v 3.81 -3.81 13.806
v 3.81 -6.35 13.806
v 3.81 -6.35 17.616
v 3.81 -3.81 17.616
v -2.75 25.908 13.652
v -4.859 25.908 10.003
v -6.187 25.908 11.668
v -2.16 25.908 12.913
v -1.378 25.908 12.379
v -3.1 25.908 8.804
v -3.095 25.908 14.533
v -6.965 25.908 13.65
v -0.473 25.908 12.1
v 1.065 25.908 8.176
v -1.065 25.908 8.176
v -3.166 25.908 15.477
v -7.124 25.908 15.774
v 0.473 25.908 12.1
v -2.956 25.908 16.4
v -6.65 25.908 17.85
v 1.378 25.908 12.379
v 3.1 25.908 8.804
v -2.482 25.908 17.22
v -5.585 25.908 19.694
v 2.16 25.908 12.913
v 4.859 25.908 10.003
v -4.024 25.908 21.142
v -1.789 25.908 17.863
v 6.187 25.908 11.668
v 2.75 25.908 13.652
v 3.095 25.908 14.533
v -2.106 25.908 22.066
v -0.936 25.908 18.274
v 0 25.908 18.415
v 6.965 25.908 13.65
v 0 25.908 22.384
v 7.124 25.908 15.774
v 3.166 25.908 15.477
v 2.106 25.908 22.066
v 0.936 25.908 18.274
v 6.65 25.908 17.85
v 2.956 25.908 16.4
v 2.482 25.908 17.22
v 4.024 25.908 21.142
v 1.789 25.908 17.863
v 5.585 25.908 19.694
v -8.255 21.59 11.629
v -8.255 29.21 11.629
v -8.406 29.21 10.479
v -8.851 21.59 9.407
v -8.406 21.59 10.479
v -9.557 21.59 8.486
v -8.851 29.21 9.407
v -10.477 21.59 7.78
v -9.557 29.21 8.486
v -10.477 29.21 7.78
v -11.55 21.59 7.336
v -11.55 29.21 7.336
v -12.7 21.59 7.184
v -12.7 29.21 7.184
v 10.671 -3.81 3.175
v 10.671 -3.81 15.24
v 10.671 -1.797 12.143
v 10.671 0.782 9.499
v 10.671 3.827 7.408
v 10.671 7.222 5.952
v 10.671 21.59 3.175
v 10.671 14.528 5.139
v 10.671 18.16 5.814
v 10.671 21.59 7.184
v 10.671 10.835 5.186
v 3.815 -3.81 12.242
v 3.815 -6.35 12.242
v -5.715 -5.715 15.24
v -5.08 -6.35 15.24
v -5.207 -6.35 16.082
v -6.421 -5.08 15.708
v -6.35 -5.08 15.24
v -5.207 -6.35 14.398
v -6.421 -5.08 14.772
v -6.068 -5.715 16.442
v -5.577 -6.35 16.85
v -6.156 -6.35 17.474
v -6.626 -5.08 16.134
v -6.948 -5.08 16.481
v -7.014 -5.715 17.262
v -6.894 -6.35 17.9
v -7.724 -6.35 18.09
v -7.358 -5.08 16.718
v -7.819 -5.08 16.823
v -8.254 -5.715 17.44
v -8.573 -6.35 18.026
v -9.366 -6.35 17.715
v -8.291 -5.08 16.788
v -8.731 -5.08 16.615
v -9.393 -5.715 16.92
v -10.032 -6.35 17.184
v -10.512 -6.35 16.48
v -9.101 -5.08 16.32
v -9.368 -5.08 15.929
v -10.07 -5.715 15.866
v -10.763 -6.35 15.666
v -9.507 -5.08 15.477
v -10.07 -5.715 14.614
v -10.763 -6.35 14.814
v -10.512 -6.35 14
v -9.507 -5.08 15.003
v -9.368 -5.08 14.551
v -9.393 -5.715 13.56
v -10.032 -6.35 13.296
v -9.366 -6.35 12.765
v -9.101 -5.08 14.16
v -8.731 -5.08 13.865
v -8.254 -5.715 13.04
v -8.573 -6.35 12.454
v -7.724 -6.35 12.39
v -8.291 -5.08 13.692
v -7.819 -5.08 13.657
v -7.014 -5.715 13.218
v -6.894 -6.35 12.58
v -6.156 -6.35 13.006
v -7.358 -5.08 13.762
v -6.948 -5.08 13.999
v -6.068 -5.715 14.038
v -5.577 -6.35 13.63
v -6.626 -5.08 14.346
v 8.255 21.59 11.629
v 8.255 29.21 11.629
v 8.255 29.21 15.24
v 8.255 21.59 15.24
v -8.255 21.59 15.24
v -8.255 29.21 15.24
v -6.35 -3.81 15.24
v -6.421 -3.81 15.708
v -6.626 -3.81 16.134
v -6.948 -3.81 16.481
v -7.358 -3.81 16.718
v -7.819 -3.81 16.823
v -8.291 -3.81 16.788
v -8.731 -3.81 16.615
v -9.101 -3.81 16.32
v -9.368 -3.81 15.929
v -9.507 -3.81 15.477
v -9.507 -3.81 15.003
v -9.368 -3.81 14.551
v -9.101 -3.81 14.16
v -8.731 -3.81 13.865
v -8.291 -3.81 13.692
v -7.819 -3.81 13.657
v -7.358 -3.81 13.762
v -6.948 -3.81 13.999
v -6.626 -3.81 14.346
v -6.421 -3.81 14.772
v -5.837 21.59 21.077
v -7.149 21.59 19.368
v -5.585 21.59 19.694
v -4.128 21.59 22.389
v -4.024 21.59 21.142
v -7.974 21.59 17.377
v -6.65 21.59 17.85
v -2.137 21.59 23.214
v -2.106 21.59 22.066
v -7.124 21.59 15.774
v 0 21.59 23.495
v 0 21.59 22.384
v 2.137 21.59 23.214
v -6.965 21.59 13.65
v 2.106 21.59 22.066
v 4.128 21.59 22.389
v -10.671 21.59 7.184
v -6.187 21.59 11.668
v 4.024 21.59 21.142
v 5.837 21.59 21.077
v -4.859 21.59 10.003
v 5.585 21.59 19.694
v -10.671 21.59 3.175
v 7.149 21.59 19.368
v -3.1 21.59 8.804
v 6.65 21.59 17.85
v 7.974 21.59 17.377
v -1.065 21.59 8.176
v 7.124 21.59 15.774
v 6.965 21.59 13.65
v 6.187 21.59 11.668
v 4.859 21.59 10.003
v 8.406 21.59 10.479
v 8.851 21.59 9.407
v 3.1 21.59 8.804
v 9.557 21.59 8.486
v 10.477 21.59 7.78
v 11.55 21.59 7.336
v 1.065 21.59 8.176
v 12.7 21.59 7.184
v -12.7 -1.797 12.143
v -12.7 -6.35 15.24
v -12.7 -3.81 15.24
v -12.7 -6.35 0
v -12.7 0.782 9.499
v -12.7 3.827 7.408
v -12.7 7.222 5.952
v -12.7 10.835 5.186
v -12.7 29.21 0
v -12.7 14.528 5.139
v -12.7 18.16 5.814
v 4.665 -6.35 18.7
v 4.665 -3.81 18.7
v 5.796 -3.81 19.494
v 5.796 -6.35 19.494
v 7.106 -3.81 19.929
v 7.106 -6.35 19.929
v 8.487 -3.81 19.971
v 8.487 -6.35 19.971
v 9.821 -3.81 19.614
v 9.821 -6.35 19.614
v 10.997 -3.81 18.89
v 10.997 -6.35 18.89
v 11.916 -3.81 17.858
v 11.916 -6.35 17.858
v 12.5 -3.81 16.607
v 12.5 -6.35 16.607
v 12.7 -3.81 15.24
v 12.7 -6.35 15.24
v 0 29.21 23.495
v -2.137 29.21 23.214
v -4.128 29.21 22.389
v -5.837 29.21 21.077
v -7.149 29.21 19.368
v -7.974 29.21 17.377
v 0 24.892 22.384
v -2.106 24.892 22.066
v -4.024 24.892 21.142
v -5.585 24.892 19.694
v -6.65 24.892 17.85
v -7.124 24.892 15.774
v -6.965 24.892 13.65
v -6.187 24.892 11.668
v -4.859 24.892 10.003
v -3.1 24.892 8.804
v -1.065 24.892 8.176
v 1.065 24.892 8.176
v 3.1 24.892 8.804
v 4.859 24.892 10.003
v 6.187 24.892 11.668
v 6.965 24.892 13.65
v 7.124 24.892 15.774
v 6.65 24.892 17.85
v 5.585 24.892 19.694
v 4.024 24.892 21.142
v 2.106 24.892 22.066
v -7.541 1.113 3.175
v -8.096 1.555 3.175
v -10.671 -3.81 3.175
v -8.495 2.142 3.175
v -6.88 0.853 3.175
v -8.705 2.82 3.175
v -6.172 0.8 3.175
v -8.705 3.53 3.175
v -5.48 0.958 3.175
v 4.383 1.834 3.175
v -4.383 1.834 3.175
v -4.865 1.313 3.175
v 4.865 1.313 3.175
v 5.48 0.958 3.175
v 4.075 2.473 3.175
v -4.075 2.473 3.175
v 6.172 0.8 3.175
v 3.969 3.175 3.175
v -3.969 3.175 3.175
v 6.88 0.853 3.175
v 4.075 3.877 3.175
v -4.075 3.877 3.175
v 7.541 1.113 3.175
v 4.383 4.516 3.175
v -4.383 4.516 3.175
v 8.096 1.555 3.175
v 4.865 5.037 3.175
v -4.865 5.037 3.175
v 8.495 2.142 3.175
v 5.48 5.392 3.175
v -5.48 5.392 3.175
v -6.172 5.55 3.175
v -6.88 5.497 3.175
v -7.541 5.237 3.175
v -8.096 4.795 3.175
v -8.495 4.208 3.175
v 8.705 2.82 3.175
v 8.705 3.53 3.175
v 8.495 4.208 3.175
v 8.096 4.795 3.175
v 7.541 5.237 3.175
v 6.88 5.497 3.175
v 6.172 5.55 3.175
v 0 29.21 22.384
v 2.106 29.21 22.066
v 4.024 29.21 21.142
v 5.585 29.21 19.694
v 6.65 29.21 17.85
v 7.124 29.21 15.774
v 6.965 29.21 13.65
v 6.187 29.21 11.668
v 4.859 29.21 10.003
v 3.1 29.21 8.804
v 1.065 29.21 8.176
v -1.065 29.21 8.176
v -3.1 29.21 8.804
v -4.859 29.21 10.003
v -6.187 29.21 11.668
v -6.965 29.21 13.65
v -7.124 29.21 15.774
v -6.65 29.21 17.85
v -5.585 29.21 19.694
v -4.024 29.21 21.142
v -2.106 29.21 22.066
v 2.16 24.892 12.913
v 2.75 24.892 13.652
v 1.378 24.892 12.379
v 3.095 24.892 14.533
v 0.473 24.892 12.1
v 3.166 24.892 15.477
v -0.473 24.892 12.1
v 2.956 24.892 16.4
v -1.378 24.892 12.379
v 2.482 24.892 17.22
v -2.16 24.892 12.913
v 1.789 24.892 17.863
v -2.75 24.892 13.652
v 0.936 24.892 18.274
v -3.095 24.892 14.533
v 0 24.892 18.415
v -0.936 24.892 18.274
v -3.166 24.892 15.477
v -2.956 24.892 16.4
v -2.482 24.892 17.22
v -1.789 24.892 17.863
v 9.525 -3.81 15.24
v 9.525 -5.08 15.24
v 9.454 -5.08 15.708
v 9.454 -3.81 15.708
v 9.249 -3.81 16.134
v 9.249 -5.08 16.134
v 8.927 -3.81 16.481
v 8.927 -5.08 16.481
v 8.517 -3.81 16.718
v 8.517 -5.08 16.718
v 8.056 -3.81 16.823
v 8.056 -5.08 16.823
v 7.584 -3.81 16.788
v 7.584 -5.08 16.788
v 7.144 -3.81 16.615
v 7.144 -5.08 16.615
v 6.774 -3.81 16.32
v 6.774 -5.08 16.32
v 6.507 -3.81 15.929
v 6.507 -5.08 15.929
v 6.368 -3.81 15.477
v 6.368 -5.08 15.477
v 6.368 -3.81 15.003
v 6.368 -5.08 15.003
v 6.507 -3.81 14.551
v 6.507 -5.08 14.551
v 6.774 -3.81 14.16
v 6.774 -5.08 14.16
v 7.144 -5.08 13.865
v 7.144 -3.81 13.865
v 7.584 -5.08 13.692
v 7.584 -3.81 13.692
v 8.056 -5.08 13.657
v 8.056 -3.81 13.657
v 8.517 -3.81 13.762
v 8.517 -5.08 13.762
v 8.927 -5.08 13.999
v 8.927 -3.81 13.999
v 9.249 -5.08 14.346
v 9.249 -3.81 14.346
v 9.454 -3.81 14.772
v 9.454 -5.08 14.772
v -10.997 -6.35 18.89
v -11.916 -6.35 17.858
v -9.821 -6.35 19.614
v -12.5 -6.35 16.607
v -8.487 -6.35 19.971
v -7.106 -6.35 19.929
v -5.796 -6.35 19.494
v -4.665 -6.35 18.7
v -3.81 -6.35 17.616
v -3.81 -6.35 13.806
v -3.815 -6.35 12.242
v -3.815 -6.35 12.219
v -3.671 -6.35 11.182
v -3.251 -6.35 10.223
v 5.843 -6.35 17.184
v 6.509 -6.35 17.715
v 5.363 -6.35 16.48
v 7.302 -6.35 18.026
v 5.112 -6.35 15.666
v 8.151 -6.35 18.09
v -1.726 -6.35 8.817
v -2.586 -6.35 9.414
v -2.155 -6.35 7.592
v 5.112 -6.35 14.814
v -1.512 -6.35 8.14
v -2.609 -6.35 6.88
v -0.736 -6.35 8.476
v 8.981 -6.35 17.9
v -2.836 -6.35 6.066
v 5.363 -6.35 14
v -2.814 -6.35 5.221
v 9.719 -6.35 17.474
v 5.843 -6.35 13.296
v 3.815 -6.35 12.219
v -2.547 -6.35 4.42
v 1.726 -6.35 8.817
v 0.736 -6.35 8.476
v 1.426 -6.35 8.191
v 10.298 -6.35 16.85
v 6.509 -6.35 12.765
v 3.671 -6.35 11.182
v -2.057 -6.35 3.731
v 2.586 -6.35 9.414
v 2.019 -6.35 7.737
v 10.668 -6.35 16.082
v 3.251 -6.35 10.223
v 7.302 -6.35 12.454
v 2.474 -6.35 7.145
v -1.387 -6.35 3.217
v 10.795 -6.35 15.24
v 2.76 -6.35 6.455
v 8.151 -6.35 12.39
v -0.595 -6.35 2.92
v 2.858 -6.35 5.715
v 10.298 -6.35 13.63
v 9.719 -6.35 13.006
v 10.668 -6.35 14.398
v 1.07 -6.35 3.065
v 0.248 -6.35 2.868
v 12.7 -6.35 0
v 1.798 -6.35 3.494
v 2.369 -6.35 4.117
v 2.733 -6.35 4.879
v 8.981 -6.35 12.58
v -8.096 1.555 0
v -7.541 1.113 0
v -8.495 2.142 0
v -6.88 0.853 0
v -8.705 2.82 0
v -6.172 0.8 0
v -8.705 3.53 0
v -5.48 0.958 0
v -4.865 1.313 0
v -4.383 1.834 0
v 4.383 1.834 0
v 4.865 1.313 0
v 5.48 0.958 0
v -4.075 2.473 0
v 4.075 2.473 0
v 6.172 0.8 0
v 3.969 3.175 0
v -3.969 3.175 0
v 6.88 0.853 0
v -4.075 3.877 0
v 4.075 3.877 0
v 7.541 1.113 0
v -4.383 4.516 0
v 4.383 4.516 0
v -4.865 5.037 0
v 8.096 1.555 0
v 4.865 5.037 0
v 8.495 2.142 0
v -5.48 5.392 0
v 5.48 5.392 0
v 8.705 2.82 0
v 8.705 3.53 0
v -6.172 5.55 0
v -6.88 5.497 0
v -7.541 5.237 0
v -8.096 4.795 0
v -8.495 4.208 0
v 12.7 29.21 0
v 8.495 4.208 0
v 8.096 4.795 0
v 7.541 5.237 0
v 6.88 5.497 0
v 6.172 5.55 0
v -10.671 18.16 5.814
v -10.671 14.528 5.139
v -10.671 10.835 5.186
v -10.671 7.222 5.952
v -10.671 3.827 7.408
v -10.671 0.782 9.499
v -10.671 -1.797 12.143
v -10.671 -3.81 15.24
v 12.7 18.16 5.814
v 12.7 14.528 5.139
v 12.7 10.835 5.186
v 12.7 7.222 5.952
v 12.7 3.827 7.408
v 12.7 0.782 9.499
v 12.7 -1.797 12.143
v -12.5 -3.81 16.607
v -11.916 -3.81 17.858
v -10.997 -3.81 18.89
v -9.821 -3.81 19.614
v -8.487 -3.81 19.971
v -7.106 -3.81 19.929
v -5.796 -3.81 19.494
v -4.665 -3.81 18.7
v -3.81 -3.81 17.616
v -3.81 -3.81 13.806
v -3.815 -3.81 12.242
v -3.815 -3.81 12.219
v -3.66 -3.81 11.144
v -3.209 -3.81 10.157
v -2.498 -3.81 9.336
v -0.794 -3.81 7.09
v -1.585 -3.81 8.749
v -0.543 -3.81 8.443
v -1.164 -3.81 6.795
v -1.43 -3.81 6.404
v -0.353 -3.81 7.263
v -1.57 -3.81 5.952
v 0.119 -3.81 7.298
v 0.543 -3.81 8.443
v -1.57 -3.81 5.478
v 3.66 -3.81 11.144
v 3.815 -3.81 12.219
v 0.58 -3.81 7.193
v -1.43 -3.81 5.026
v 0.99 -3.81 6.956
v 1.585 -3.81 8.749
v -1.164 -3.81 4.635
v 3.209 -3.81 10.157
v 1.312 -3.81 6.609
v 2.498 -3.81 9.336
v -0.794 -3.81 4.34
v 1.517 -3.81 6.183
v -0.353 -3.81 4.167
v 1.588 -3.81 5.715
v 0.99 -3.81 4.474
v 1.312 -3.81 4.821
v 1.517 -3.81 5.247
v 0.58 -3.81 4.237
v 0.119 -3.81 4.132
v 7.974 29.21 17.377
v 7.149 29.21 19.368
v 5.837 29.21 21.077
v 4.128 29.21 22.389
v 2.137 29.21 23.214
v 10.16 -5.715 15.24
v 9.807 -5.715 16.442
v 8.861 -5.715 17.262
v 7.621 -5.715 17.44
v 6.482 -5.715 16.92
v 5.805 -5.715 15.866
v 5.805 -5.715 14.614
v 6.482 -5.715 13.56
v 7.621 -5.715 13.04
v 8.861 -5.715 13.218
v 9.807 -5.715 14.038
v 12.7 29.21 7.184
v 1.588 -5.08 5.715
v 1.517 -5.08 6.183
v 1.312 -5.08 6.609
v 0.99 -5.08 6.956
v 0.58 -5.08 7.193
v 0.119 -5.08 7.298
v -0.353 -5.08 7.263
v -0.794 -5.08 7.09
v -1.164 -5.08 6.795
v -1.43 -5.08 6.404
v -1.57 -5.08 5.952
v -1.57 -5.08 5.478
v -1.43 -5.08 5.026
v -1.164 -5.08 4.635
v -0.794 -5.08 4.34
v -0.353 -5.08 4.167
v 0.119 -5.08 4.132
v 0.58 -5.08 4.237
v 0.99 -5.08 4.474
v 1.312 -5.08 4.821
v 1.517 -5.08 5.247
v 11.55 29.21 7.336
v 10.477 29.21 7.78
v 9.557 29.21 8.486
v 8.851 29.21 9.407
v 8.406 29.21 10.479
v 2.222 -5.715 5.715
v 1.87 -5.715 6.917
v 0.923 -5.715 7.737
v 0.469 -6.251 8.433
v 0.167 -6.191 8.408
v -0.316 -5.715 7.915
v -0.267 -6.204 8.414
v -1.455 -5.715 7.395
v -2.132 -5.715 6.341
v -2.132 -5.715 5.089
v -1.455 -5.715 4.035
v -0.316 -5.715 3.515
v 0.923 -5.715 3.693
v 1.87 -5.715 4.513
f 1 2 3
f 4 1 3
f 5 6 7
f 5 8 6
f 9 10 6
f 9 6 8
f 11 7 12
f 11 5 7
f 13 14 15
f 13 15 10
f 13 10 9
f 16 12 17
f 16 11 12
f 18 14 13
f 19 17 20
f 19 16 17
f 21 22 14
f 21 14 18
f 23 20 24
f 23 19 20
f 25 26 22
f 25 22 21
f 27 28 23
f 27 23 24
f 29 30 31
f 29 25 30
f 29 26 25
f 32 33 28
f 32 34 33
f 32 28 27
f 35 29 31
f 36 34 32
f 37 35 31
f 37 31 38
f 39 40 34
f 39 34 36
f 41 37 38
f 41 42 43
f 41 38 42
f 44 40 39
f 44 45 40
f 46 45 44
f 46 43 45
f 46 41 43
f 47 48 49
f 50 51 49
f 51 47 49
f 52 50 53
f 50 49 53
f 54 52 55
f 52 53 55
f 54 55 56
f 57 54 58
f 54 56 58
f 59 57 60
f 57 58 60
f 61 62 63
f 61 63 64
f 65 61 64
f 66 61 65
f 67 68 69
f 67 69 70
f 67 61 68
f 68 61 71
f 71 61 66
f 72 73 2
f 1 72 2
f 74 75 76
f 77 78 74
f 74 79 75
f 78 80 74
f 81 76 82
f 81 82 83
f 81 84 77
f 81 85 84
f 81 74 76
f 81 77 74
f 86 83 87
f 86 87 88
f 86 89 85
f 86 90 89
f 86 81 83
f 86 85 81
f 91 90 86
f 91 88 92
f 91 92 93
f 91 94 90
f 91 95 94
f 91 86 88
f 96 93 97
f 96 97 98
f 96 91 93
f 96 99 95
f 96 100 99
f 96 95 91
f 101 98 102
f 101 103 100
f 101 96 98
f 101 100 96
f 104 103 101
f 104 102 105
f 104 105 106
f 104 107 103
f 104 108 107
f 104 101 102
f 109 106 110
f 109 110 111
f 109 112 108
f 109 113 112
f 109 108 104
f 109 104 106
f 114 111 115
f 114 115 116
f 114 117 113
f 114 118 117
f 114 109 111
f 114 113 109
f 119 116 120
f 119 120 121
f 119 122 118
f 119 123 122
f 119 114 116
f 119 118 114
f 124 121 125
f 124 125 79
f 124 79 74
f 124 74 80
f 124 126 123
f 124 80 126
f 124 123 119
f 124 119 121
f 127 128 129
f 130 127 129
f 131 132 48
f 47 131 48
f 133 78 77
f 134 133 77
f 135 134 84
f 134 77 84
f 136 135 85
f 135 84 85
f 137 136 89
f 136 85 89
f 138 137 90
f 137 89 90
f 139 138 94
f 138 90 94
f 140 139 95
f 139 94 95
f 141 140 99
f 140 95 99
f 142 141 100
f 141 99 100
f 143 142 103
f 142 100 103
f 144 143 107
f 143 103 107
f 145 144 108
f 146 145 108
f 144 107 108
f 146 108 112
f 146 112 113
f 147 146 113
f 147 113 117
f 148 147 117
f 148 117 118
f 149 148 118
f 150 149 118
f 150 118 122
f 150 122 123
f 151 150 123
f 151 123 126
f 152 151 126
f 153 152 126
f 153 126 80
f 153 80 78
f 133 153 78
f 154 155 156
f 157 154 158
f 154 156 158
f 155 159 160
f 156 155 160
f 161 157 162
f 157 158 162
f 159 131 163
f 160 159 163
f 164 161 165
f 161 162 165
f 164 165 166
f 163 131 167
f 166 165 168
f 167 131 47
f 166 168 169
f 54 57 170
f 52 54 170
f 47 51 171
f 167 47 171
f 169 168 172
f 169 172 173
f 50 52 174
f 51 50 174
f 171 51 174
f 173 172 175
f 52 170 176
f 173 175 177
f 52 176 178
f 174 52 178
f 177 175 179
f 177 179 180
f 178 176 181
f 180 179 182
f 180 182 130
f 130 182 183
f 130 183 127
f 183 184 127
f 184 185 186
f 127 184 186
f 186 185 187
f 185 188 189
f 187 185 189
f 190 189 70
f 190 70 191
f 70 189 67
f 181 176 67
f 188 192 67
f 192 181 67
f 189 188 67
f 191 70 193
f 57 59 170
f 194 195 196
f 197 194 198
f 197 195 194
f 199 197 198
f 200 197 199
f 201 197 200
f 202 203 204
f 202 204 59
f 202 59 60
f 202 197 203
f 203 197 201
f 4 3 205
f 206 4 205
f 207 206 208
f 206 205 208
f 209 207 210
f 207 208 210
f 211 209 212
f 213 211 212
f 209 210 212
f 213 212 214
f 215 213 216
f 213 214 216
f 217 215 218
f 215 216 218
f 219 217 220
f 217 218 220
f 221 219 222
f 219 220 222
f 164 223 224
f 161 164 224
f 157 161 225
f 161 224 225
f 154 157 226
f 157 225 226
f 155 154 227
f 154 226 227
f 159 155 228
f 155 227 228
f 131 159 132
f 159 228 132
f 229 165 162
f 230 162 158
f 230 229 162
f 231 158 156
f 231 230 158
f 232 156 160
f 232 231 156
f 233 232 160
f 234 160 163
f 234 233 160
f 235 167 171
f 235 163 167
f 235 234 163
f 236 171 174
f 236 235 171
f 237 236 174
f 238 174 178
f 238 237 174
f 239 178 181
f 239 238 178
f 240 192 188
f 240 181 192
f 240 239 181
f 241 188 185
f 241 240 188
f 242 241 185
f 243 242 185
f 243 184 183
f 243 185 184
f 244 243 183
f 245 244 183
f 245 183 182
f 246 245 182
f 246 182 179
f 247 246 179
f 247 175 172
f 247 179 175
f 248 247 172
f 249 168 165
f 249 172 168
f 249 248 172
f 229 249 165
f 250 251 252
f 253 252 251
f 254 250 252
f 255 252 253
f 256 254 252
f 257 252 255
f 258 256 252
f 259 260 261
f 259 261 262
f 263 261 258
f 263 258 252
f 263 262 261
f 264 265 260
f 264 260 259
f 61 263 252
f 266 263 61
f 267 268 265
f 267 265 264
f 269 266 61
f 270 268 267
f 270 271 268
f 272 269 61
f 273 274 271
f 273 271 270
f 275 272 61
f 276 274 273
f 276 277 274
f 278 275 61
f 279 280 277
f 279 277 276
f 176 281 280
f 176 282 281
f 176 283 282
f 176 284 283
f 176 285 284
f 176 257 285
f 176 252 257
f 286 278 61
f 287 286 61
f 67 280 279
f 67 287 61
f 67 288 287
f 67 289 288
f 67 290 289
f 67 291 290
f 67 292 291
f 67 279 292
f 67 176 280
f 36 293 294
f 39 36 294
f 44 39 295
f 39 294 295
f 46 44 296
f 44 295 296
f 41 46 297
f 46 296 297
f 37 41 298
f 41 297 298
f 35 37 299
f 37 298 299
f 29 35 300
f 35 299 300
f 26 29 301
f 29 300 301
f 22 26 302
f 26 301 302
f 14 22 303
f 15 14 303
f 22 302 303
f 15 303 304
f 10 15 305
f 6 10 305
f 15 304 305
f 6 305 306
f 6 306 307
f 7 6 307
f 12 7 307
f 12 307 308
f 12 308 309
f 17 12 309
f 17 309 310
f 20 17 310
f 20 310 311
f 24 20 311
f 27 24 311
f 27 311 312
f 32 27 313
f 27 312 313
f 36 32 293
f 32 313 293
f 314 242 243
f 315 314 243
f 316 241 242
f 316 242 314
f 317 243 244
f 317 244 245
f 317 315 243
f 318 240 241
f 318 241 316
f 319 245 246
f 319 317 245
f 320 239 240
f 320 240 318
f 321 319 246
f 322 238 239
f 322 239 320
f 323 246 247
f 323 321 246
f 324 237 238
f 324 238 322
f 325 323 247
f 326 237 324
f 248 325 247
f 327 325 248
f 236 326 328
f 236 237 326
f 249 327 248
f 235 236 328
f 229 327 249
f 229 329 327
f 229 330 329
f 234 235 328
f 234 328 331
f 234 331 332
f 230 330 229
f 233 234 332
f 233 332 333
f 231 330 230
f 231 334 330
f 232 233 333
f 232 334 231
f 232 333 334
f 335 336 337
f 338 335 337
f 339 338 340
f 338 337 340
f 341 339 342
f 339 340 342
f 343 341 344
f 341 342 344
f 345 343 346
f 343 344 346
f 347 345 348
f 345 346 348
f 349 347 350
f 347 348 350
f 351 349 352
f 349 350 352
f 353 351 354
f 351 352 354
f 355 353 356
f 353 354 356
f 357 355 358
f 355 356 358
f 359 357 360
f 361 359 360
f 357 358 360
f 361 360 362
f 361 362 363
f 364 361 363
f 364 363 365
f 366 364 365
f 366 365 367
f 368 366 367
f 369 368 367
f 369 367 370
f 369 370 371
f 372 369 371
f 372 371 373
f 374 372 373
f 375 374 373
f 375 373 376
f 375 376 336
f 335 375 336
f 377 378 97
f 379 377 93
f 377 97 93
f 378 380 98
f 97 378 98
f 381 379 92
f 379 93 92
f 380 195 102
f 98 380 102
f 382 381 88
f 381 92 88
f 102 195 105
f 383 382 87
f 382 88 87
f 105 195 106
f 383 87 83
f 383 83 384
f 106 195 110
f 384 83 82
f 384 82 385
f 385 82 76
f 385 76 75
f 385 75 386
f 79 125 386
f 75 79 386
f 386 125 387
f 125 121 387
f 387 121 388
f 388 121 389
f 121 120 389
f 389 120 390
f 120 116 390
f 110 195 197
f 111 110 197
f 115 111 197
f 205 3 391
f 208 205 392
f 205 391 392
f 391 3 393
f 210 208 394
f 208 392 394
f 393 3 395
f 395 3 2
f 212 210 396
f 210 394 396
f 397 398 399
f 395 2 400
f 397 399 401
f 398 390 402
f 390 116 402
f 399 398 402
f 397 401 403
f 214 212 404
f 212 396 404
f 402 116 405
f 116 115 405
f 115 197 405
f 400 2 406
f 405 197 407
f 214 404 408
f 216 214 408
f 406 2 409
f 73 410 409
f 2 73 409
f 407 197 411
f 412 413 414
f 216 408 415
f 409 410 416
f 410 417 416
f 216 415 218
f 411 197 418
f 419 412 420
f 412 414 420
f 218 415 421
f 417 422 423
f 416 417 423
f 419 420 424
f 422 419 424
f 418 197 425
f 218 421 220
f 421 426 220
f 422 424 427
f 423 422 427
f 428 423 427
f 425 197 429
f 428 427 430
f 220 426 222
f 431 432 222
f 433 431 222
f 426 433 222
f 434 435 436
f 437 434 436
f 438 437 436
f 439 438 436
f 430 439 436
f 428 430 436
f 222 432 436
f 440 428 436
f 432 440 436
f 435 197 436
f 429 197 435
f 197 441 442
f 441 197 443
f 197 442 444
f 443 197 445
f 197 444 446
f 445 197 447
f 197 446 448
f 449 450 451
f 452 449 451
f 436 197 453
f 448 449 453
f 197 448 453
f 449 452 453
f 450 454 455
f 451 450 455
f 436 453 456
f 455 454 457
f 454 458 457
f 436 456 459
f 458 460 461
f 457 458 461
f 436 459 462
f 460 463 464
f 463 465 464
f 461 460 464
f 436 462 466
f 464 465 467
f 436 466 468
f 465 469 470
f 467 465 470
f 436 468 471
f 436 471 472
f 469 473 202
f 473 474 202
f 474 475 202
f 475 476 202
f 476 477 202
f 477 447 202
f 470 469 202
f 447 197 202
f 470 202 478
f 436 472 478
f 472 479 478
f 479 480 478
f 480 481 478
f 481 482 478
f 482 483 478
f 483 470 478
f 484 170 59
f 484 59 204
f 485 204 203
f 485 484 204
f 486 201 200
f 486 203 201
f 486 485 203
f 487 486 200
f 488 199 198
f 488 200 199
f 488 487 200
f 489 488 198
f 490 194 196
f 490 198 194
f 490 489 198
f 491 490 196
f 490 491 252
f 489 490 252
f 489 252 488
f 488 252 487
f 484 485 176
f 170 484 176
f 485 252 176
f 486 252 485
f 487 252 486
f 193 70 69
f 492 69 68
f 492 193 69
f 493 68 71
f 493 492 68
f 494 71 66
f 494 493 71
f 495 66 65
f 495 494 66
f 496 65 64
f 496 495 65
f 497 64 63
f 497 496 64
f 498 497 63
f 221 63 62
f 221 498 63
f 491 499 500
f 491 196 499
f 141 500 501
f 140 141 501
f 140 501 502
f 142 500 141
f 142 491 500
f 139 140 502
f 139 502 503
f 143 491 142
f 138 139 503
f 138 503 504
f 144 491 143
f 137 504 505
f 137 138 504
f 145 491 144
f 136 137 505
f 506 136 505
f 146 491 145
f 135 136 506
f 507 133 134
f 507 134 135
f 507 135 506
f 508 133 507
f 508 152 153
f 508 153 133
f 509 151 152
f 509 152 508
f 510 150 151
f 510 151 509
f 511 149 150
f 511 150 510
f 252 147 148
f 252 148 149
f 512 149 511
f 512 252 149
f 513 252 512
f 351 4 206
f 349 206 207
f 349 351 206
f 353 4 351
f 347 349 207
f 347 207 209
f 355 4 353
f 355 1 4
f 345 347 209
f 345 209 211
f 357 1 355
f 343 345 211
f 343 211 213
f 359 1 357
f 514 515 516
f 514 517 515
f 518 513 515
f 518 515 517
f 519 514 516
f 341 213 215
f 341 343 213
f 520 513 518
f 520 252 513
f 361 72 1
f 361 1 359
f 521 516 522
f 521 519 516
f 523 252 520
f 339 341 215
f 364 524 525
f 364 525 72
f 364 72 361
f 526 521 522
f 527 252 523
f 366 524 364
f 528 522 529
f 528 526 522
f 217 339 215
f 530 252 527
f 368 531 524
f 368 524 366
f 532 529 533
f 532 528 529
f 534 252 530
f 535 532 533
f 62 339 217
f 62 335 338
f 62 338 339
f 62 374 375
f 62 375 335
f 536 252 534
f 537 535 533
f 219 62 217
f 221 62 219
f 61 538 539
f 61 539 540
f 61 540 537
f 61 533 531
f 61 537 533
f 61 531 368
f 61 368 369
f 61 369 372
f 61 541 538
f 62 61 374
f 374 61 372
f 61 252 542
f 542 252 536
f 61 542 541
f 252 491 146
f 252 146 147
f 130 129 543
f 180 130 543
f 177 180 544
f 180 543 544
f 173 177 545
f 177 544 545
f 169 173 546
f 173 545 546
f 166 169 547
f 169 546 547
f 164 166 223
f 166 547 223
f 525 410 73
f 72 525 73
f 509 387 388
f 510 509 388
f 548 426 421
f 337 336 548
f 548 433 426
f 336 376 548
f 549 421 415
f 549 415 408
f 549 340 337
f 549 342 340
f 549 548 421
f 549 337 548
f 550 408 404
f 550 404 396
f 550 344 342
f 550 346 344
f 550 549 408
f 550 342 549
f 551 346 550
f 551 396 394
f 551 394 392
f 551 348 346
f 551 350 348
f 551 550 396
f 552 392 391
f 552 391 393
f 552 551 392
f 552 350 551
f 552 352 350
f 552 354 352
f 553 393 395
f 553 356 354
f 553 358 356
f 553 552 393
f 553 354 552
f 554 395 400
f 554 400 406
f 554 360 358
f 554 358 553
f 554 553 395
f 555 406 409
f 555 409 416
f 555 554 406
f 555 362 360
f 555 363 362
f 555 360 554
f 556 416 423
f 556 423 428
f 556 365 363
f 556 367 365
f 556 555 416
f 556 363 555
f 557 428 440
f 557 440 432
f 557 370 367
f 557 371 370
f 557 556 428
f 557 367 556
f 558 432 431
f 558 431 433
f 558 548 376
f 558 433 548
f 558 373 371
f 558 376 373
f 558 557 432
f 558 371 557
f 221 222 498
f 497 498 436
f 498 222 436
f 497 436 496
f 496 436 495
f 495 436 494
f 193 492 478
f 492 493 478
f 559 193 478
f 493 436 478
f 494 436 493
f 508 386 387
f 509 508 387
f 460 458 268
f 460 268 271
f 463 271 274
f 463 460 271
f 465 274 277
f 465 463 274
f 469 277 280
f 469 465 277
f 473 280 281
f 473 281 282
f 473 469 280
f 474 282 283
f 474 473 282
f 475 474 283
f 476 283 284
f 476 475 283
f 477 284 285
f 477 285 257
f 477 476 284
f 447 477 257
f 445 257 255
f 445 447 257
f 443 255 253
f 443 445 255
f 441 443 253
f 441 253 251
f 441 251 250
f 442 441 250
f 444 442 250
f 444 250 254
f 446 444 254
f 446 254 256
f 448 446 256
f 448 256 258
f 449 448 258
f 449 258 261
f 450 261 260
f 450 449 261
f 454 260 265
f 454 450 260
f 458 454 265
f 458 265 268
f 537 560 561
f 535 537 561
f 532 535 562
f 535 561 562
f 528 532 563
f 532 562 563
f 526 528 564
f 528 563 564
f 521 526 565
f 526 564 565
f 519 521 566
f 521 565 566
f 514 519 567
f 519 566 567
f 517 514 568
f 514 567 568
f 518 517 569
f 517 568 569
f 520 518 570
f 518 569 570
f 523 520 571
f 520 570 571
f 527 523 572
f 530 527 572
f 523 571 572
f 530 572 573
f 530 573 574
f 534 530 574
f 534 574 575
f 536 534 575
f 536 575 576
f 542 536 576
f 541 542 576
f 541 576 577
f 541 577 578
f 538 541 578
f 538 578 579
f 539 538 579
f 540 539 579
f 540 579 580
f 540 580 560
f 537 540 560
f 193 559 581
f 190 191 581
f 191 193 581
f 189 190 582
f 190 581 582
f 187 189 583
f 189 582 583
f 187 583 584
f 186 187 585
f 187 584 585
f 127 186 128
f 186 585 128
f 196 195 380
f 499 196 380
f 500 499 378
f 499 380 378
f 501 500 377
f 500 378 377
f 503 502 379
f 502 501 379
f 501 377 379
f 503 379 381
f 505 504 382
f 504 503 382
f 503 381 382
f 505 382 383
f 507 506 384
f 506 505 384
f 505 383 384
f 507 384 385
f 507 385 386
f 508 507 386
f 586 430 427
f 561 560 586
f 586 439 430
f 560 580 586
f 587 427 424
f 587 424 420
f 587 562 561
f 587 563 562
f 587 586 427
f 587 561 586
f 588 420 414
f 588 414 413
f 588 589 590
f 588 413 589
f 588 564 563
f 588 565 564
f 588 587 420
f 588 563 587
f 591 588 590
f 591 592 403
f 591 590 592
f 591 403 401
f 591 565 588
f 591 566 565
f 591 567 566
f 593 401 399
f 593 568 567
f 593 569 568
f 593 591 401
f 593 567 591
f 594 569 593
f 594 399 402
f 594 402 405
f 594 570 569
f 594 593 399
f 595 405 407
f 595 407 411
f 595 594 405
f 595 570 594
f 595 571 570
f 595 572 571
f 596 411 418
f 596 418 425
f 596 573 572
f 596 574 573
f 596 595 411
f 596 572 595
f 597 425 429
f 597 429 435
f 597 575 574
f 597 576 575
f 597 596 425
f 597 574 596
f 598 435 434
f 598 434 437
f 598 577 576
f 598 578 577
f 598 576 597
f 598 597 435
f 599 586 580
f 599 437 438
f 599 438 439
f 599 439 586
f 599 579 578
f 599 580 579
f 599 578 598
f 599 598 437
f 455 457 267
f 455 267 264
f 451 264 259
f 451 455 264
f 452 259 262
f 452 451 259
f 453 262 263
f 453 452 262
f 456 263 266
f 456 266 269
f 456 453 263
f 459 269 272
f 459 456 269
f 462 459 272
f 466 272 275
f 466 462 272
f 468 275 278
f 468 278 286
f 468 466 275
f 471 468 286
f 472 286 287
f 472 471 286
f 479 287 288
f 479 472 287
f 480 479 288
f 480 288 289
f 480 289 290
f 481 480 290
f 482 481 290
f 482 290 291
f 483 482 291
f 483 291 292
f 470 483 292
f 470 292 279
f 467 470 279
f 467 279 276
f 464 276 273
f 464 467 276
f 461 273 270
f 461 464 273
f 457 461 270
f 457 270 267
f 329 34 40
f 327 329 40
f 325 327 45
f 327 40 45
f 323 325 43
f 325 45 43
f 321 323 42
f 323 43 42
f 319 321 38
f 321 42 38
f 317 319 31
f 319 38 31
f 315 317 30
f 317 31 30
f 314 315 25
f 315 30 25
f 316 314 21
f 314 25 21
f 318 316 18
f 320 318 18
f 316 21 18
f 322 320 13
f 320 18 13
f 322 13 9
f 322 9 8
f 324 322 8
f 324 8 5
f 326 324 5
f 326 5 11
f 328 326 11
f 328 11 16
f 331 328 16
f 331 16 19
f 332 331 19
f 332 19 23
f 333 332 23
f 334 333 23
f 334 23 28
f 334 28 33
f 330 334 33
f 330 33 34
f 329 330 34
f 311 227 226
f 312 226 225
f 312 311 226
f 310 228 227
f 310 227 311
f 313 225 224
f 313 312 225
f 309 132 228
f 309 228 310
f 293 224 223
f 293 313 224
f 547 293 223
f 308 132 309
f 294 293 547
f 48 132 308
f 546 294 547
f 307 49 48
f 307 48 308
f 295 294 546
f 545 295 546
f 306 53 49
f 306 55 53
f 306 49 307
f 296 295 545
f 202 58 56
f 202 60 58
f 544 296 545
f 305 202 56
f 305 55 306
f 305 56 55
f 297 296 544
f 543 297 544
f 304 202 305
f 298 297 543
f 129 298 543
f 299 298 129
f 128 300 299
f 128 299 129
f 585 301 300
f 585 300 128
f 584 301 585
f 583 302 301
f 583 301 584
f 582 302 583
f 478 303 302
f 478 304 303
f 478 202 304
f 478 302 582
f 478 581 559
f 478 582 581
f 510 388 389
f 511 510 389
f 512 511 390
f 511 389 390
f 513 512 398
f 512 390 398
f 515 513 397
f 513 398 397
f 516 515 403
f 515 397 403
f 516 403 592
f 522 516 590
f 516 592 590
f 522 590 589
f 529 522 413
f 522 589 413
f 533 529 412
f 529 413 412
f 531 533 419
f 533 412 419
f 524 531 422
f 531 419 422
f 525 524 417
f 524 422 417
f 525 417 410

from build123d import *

# Parameters (mm, degrees)
SKETCH1_W           = 25.4
SKETCH1_H           = 35.56
SKETCH1_R           = 2.38125
BOSS_EXTRUDE1_DEPTH = 3.175
SKETCH7_W           = 25.4
SKETCH7_H           = 2.54
SKETCH7_H_2         = 7.62
BOSS_EXTRUDE3_DEPTH = 20.32
SKETCH11_R          = 1.5875
CUT_EXTRUDE1_DEPTH  = 10
CHAMFER2_SIZE       = 1.27
SKETCH13_R          = 3.175
CUT_EXTRUDE2_DEPTH  = 12.7
SKETCH14_R          = 7.14375
CUT_EXTRUDE3_DEPTH  = 3.302
CUT_EXTRUDE4_START  = -3.302
SKETCH15_R          = 7.14375
CUT_EXTRUDE4_DEPTH  = 3.302
CUT_EXTRUDE5_DEPTH  = 12.7
SKETCH17_W          = 2.029010409
SKETCH17_H          = 25.4
BOSS_EXTRUDE4_DEPTH = 12.7
CUT_EXTRUDE6_DEPTH  = 46.281333074


with BuildPart() as part:
    # Sketch1 → Boss-Extrude1 (new body)
    with BuildSketch(Plane.XY):
        with Locations((0, 11.43)):
            Rectangle(SKETCH1_W, SKETCH1_H)
        with Locations((-6.35, 3.175)):
            Circle(SKETCH1_R, mode=Mode.SUBTRACT)
        with Locations(Location((6.35, 3.175, 0), (0, 0, 180))):
            Circle(SKETCH1_R, mode=Mode.SUBTRACT)
    extrude(amount=BOSS_EXTRUDE1_DEPTH)

    # Sketch7 → Boss-Extrude3 (add)
    with BuildSketch(Plane.XY.offset(3.175)):
        with Locations((0, -5.08)):
            Rectangle(SKETCH7_W, SKETCH7_H)
        with Locations((0, 25.4)):
            Rectangle(SKETCH7_W, SKETCH7_H_2)
    extrude(amount=BOSS_EXTRUDE3_DEPTH)

    # Sketch11 → Cut-Extrude1 (cut)
    with BuildSketch(Plane.XZ.offset(6.35)):
        with Locations((-7.9375, 15.24)):
            Circle(SKETCH11_R)
        with Locations((7.9375, 15.24)):
            Circle(SKETCH11_R)
        with Locations((0, 5.715)):
            Circle(SKETCH11_R)
        with BuildLine():
            Line((-3.814625586, 12.241539102), (-3.814692285, 12.218981082))
            ThreePointArc((-3.814692285, 12.218981082), (0, 8.404288797), (3.814692285, 12.218981082))
            Line((3.814692285, 12.218981082), (3.814625586, 12.241539102))
            Line((3.814625586, 12.241539102), (3.81, 13.805952441))
            Line((3.81, 13.805952441), (3.81, 17.615952441))
            ThreePointArc((3.81, 17.615952441), (9.167172212, 19.841012117), (12.7, 15.24))
            Line((12.7, 15.24), (12.7, 23.495))
            Line((12.7, 23.495), (-12.7, 23.495))
            Line((-12.7, 23.495), (-12.7, 15.24))
            ThreePointArc((-12.7, 15.24), (-9.167172212, 19.841012117), (-3.81, 17.615952441))
            Line((-3.81, 17.615952441), (-3.81, 13.805952441))
            Line((-3.81, 13.805952441), (-3.814625586, 12.241539102))
        make_face()
    extrude(amount=-CUT_EXTRUDE1_DEPTH, mode=Mode.SUBTRACT)

    # Chamfer2
    # the kernel refuses this chamfer: 1.27 mm, written as the material it takes off along each edge
    with BuildSketch(Plane(origin=(-7.9375, -6.35, 15.24), x_dir=(1, 0, 0), z_dir=(0, 0, -1))) as chamfer2_piece_1:
        Polygon((1.5875 + CHAMFER2_SIZE, 0), (1.5875, -CHAMFER2_SIZE), (1.5875, 0), align=None)
    revolve(axis=Axis((-7.9375, -6.35, 15.24), (0, -1, 0)), mode=Mode.SUBTRACT)
    with BuildSketch(Plane(origin=(7.9375, -6.35, 15.24), x_dir=(1, 0, 0), z_dir=(0, 0, -1))) as chamfer2_piece_2:
        Polygon((1.5875 + CHAMFER2_SIZE, 0), (1.5875, -CHAMFER2_SIZE), (1.5875, 0), align=None)
    revolve(axis=Axis((7.9375, -6.35, 15.24), (0, -1, 0)), mode=Mode.SUBTRACT)
    with BuildSketch(Plane(origin=(0, -6.35, 5.715), x_dir=(1, 0, 0), z_dir=(0, 0, -1))) as chamfer2_piece_3:
        Polygon((1.5875 + CHAMFER2_SIZE, 0), (1.5875, -CHAMFER2_SIZE), (1.5875, 0), align=None)
    revolve(axis=Axis((0, -6.35, 5.715), (0, -1, 0)), mode=Mode.SUBTRACT)

    # Sketch13 → Cut-Extrude2 (cut)
    with BuildSketch(Plane(origin=(0, 29.21, 0), x_dir=(1, 0, 0), z_dir=(0, 1, 0))):
        with Locations(Location((0, -15.24, 0), (0, 0, 270))):
            Circle(SKETCH13_R)
    extrude(amount=-CUT_EXTRUDE2_DEPTH, mode=Mode.SUBTRACT)

    # Sketch14 → Cut-Extrude3 (cut)
    with BuildSketch(Plane(origin=(0, 29.21, 0), x_dir=(1, 0, 0), z_dir=(0, 1, 0))):
        with Locations(Location((0, -15.24, 0), (0, 0, 270))):
            Circle(SKETCH14_R)
    extrude(amount=-CUT_EXTRUDE3_DEPTH, mode=Mode.SUBTRACT)

    # Sketch15 → Cut-Extrude4 (cut)
    with BuildSketch(Plane.XZ.offset(-21.59).offset(CUT_EXTRUDE4_START)):
        with Locations(Location((0, 15.24, 0), (0, 0, 90))):
            Circle(SKETCH15_R)
    extrude(amount=CUT_EXTRUDE4_DEPTH, mode=Mode.SUBTRACT)

    # Sketch16 → Cut-Extrude5 (cut)
    with BuildSketch(Plane(origin=(0, 29.21, 0), x_dir=(1, 0, 0), z_dir=(0, 1, 0))):
        with BuildLine():
            ThreePointArc((8.255, -15.24), (5.837166479, -21.077166479), (0, -23.495))
            Line((0, -23.495), (12.7, -23.495))
            Line((12.7, -23.495), (12.7, -7.184415797))
            ThreePointArc((12.7, -7.184415797), (9.556910358, -8.486326154), (8.255, -11.629415797))
            Line((8.255, -11.629415797), (8.255, -15.24))
        make_face()
        with BuildLine():
            ThreePointArc((0, -23.495), (-5.837166479, -21.077166479), (-8.255, -15.24))
            Line((-8.255, -15.24), (-8.255, -11.629415797))
            ThreePointArc((-8.255, -11.629415797), (-9.556910358, -8.486326154), (-12.7, -7.184415797))
            Line((-12.7, -7.184415797), (-12.7, -23.495))
            Line((-12.7, -23.495), (0, -23.495))
        make_face()
    extrude(amount=-CUT_EXTRUDE5_DEPTH, mode=Mode.SUBTRACT)

    # Sketch17 → Boss-Extrude4 (add)
    with BuildSketch(Plane.XY.offset(3.175)):
        with Locations((-11.685494796, 8.89)):
            Rectangle(SKETCH17_W, SKETCH17_H)
        with Locations((11.685494796, 8.89)):
            Rectangle(SKETCH17_W, SKETCH17_H)
    extrude(amount=BOSS_EXTRUDE4_DEPTH)

    # Sketch18 → Cut-Extrude6 (cut, through all)
    with BuildSketch(Plane(origin=(12.7, 0, 0), x_dir=(0, 0, -1), z_dir=(1, 0, 0))):
        with BuildLine():
            ThreePointArc((-7.184415797, 21.59), (-5.951695656, 7.221633885), (-15.24, -3.81))
            Line((-15.24, -3.81), (-15.875, -3.81))
            Line((-15.875, -3.81), (-15.875, 21.59))
            Line((-15.875, 21.59), (-7.184415797, 21.59))
        make_face()
    extrude(amount=-CUT_EXTRUDE6_DEPTH, mode=Mode.SUBTRACT)


solid = part.part
